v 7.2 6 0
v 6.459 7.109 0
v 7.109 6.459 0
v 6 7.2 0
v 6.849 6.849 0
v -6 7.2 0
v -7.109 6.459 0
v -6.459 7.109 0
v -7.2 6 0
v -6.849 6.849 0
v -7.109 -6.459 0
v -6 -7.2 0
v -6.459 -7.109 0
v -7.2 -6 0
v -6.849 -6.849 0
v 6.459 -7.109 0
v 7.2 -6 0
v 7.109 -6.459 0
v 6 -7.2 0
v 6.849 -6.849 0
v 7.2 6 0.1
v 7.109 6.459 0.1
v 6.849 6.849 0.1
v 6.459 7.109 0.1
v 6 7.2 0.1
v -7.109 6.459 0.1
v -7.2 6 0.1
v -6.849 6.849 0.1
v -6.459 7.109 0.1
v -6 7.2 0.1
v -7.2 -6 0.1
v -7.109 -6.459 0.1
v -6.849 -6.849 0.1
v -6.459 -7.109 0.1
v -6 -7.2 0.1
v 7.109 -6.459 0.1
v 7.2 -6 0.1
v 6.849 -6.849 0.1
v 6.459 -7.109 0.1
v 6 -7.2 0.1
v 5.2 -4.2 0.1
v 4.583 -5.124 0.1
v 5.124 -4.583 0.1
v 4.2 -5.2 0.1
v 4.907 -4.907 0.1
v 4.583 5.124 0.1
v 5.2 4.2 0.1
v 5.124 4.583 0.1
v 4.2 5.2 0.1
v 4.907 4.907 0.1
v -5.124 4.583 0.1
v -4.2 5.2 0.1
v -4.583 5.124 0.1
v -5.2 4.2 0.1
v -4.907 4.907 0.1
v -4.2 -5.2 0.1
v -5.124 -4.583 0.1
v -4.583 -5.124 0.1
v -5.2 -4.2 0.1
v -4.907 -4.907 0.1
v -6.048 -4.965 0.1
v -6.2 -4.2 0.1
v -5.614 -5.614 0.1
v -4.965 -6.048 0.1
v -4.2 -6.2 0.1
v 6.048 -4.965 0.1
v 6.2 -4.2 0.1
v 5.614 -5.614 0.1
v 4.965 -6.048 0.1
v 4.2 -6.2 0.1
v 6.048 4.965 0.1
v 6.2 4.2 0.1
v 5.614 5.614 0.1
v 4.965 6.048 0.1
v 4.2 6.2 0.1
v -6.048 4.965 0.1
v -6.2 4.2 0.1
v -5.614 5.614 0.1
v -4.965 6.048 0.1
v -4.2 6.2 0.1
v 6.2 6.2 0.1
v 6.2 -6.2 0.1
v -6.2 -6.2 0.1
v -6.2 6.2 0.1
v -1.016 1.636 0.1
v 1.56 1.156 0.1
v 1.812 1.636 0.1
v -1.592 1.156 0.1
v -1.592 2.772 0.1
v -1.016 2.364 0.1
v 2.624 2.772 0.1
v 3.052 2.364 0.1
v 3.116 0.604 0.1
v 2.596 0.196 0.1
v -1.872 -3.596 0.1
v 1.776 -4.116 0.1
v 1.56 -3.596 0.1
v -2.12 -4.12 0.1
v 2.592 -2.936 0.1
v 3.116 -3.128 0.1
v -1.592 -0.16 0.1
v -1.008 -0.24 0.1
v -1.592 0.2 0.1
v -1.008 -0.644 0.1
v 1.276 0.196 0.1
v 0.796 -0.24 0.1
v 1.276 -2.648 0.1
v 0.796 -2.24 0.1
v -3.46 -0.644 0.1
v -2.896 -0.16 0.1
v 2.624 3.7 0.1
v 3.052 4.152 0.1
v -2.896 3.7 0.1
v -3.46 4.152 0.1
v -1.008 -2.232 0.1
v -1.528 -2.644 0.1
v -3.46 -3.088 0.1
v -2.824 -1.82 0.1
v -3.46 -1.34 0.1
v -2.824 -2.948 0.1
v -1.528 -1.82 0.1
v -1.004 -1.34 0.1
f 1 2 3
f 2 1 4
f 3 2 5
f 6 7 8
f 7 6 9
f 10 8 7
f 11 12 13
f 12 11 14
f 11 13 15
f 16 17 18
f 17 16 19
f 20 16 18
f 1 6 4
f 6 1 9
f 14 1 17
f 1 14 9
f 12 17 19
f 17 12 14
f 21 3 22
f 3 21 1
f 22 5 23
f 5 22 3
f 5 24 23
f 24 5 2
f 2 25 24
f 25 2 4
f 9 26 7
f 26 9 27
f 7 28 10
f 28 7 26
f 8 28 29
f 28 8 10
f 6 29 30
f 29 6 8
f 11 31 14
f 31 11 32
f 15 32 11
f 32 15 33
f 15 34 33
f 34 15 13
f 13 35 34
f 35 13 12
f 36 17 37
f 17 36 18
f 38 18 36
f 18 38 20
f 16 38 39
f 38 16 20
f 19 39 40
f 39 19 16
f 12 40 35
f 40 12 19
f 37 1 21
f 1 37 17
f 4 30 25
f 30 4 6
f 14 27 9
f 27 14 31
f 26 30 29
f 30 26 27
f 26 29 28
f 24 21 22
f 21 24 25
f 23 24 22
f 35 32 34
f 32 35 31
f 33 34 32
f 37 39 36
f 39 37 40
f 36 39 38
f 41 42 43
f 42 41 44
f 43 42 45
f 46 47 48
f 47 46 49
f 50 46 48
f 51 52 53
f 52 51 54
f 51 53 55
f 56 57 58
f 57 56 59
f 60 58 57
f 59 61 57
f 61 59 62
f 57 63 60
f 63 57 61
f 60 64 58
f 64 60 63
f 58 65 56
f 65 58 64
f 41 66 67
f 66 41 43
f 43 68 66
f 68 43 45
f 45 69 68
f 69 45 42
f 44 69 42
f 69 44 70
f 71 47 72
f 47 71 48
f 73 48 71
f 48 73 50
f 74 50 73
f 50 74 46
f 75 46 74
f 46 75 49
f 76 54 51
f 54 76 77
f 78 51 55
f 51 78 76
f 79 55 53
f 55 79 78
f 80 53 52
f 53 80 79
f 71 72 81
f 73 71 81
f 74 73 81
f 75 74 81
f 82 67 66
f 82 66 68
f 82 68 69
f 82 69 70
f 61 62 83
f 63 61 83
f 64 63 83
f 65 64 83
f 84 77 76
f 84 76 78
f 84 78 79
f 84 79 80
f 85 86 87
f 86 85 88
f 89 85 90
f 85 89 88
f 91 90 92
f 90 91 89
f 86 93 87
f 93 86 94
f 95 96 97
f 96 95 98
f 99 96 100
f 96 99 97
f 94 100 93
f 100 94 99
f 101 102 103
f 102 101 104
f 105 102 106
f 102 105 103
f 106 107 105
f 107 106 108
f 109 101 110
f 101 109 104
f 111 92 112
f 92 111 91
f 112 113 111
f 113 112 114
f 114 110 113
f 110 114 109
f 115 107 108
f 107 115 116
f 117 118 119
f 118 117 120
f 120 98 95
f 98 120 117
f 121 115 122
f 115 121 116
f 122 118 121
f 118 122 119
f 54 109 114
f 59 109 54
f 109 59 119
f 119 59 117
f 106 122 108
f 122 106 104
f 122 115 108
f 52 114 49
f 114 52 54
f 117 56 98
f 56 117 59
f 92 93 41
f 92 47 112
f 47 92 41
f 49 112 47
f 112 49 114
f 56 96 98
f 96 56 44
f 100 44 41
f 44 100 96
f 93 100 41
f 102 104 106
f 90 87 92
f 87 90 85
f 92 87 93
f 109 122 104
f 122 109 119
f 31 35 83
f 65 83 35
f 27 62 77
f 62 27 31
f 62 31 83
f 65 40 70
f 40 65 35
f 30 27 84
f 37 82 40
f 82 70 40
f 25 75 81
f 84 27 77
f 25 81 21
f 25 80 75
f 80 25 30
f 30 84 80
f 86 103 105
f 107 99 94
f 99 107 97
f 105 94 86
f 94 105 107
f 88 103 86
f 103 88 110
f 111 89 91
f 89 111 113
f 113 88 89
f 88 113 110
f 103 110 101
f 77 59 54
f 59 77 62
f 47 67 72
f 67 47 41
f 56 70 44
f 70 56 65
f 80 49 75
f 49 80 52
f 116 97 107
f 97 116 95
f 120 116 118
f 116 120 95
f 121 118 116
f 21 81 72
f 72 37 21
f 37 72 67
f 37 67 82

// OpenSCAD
// file: ../p/1-4cyli.scad
use <../lib.scad>
function ldraw_lib__1_4cyli() = [
// 0 Cylinder 0.25
// 0 Name: 1-4cyli.dat
// 0 Author: James Jessiman
// 0 !LDRAW_ORG Primitive UPDATE 2012-01
// 0 !LICENSE Licensed under CC BY 4.0 : see CAreadme.txt
// 
// 0 BFC CERTIFY CCW
  [0,"BFC","CERTIFY"],
  [0,"BFC","CCW"],
// 
// 0 !HISTORY 2002-03-23 [sbliss] Added BFC statement.
// 0 !HISTORY 2002-04-25 [PTadmin] Official Update 2002-02
// 0 !HISTORY 2007-06-22 [PTadmin] Header formatted for Contributor Agreement
// 0 !HISTORY 2008-07-01 [PTadmin] Official Update 2008-01
// 0 !HISTORY 2012-02-16 [Philo] Changed to CCW
// 0 !HISTORY 2012-03-30 [PTadmin] Official Update 2012-01
// 
// 
// 4 16 1 1 0 0.9239 1 0.3827 0.9239 0 0.3827 1 0 0
  [4,16,1,1,0,0.9239,1,0.3827,0.9239,0,0.3827,1,0,0],
// 5 24 1 0 0 1 1 0 0.9239 0 0.3827 1 0 -1
  [5,24,1,0,0,1,1,0,0.9239,0,0.3827,1,0,-1],
// 4 16 0.9239 1 0.3827 0.7071 1 0.7071 0.7071 0 0.7071 0.9239 0 0.3827
  [4,16,0.9239,1,0.3827,0.7071,1,0.7071,0.7071,0,0.7071,0.9239,0,0.3827],
// 5 24 0.9239 0 0.3827 0.9239 1 0.3827 0.7071 0 0.7071 1 0 0
  [5,24,0.9239,0,0.3827,0.9239,1,0.3827,0.7071,0,0.7071,1,0,0],
// 4 16 0.7071 1 0.7071 0.3827 1 0.9239 0.3827 0 0.9239 0.7071 0 0.7071
  [4,16,0.7071,1,0.7071,0.3827,1,0.9239,0.3827,0,0.9239,0.7071,0,0.7071],
// 5 24 0.7071 0 0.7071 0.7071 1 0.7071 0.3827 0 0.9239 0.9239 0 0.3827
  [5,24,0.7071,0,0.7071,0.7071,1,0.7071,0.3827,0,0.9239,0.9239,0,0.3827],
// 4 16 0.3827 1 0.9239 0 1 1 0 0 1 0.3827 0 0.9239
  [4,16,0.3827,1,0.9239,0,1,1,0,0,1,0.3827,0,0.9239],
// 5 24 0.3827 0 0.9239 0.3827 1 0.9239 0 0 1 0.7071 0 0.7071
  [5,24,0.3827,0,0.9239,0.3827,1,0.9239,0,0,1,0.7071,0,0.7071],
// 5 24 0 0 1 0 1 1 0.3827 0 0.9239 -1 0 1
  [5,24,0,0,1,0,1,1,0.3827,0,0.9239,-1,0,1],
];
module ldraw_lib__1_4cyli(step=0, col=false, unit=2/5, alt=false, line=0.2, solid=!$preview)
    makepoly(ldraw_lib__1_4cyli(), step=step, col=col, unit=unit, alt=alt, line=line, solid=solid);
ldraw_lib__1_4cyli(line=0.2);
// file: s/6237277as01.scad
use <../../lib.scad>
use <../../p/1-4chrd.scad>
use <../../p/1-4cyli.scad>
function ldraw_lib__s__6237277as01() = [
// 0 ~Sticker  1.8 x  1.8 without Top Surface
// 0 Name: s\6237277as01.dat
// 0 Author: Alex Herrera [alanbrito98]
// 0 !LDRAW_ORG Subpart UPDATE 2023-04
// 0 !LICENSE Licensed under CC BY 4.0 : see CAreadme.txt
// 
// 0 BFC CERTIFY CCW
  [0,"BFC","CERTIFY"],
  [0,"BFC","CCW"],
// 
// 0 !HISTORY 2023-08-25 [OrionP] Official Update 2023-04
// 
// 
// 0 // Bottom
// 0 // Primitives
// 1 16 15 0 15 3 0 0 0 -1 0 0 0 3 1-4chrd.dat
  [1,16,15,0,15,3,0,0,0,-1,0,0,0,3, ldraw_lib__1_4chrd()],
// 1 16 -15 0 15 -3 0 0 0 -1 0 0 0 3 1-4chrd.dat
  [1,16,-15,0,15,-3,0,0,0,-1,0,0,0,3, ldraw_lib__1_4chrd()],
// 1 16 -15 0 -15 -3 0 0 0 -1 0 0 0 -3 1-4chrd.dat
  [1,16,-15,0,-15,-3,0,0,0,-1,0,0,0,-3, ldraw_lib__1_4chrd()],
// 1 16 15 0 -15 3 0 0 0 -1 0 0 0 -3 1-4chrd.dat
  [1,16,15,0,-15,3,0,0,0,-1,0,0,0,-3, ldraw_lib__1_4chrd()],
// 0 // Bottom Faces
// 4 16 18 0 15 -18 0 15 -15 0 18 15 0 18
  [4,16,18,0,15,-18,0,15,-15,0,18,15,0,18],
// 4 16 -18 0 -15 -18 0 15 18 0 15 18 0 -15
  [4,16,-18,0,-15,-18,0,15,18,0,15,18,0,-15],
// 4 16 15 0 -18 -15 0 -18 -18 0 -15 18 0 -15
  [4,16,15,0,-18,-15,0,-18,-18,0,-15,18,0,-15],
// 0 // Sides
// 0 // Primitives
// 1 16 15 0 15 3 0 0 0 -0.25 0 0 0 3 1-4cyli.dat
  [1,16,15,0,15,3,0,0,0,-0.25,0,0,0,3, ldraw_lib__1_4cyli()],
// 1 16 -15 0 15 -3 0 0 0 -0.25 0 0 0 3 1-4cyli.dat
  [1,16,-15,0,15,-3,0,0,0,-0.25,0,0,0,3, ldraw_lib__1_4cyli()],
// 1 16 -15 0 -15 -3 0 0 0 -0.25 0 0 0 -3 1-4cyli.dat
  [1,16,-15,0,-15,-3,0,0,0,-0.25,0,0,0,-3, ldraw_lib__1_4cyli()],
// 1 16 15 0 -15 3 0 0 0 -0.25 0 0 0 -3 1-4cyli.dat
  [1,16,15,0,-15,3,0,0,0,-0.25,0,0,0,-3, ldraw_lib__1_4cyli()],
// 0 // Side Faces
// 4 16 -15 0 -18 15 0 -18 15 -0.25 -18 -15 -0.25 -18
  [4,16,-15,0,-18,15,0,-18,15,-0.25,-18,-15,-0.25,-18],
// 4 16 18 0 -15 18 0 15 18 -0.25 15 18 -0.25 -15
  [4,16,18,0,-15,18,0,15,18,-0.25,15,18,-0.25,-15],
// 4 16 15 0 18 -15 0 18 -15 -0.25 18 15 -0.25 18
  [4,16,15,0,18,-15,0,18,-15,-0.25,18,15,-0.25,18],
// 4 16 -18 0 15 -18 0 -15 -18 -0.25 -15 -18 -0.25 15
  [4,16,-18,0,15,-18,0,-15,-18,-0.25,-15,-18,-0.25,15],
// 
];
module ldraw_lib__s__6237277as01(step=0, col=false, unit=2/5, alt=false, line=0.2, solid=!$preview)
    makepoly(ldraw_lib__s__6237277as01(), step=step, col=col, unit=unit, alt=alt, line=line, solid=solid);
ldraw_lib__s__6237277as01(line=0.2);
// file: ../p/1-4ring1.scad
use <../lib.scad>
function ldraw_lib__1_4ring1() = [
// 0 Ring  1 x 0.25
// 0 Name: 1-4ring1.dat
// 0 Author: Chris Dee [cwdee]
// 0 !LDRAW_ORG Primitive UPDATE 2012-01
// 0 !LICENSE Licensed under CC BY 4.0 : see CAreadme.txt
// 
// 0 BFC CERTIFY CCW
  [0,"BFC","CERTIFY"],
  [0,"BFC","CCW"],
// 
// 0 !HISTORY 2000-05-07 [PTadmin] Official Update 2000-01
// 0 !HISTORY 2002-11-22 [hafhead] Added BFC statement
// 0 !HISTORY 2002-11-30 [PTadmin] Official Update 2002-05
// 0 !HISTORY 2007-06-22 [PTadmin] Header formatted for Contributor Agreement
// 0 !HISTORY 2008-07-01 [PTadmin] Official Update 2008-01
// 0 !HISTORY 2012-02-16 [Philo] Changed to CCW
// 0 !HISTORY 2012-03-30 [PTadmin] Official Update 2012-01
// 
// 
// 4 16 2 0 0 1.8478 0 0.7654 0.9239 0 0.3827 1 0 0
  [4,16,2,0,0,1.8478,0,0.7654,0.9239,0,0.3827,1,0,0],
// 4 16 1.8478 0 0.7654 1.4142 0 1.4142 0.7071 0 0.7071 0.9239 0 0.3827
  [4,16,1.8478,0,0.7654,1.4142,0,1.4142,0.7071,0,0.7071,0.9239,0,0.3827],
// 4 16 1.4142 0 1.4142 0.7654 0 1.8478 0.3827 0 0.9239 0.7071 0 0.7071
  [4,16,1.4142,0,1.4142,0.7654,0,1.8478,0.3827,0,0.9239,0.7071,0,0.7071],
// 4 16 0.7654 0 1.8478 0 0 2 0 0 1 0.3827 0 0.9239
  [4,16,0.7654,0,1.8478,0,0,2,0,0,1,0.3827,0,0.9239],
];
module ldraw_lib__1_4ring1(step=0, col=false, unit=2/5, alt=false, line=0.2, solid=!$preview)
    makepoly(ldraw_lib__1_4ring1(), step=step, col=col, unit=unit, alt=alt, line=line, solid=solid);
ldraw_lib__1_4ring1(line=0.2);
// file: ../p/1-4ndis.scad
use <../lib.scad>
function ldraw_lib__1_4ndis() = [
// 0 Disc Negative 0.25
// 0 Name: 1-4ndis.dat
// 0 Author: James Jessiman
// 0 !LDRAW_ORG Primitive UPDATE 2012-01
// 0 !LICENSE Licensed under CC BY 4.0 : see CAreadme.txt
// 
// 0 BFC CERTIFY CCW
  [0,"BFC","CERTIFY"],
  [0,"BFC","CCW"],
// 
// 0 !HISTORY 2002-03-23 [sbliss] Added BFC Statement
// 0 !HISTORY 2002-04-25 [PTadmin] Official Update 2002-02
// 0 !HISTORY 2007-06-22 [PTadmin] Header formatted for Contributor Agreement
// 0 !HISTORY 2008-07-01 [PTadmin] Official Update 2008-01
// 0 !HISTORY 2012-02-16 [Philo] Changed to CCW
// 0 !HISTORY 2012-03-30 [PTadmin] Official Update 2012-01
// 
// 
// 3 16 0.9239 0 0.3827 1 0 0 1 0 1
  [3,16,0.9239,0,0.3827,1,0,0,1,0,1],
// 3 16 0.7071 0 0.7071 0.9239 0 0.3827 1 0 1
  [3,16,0.7071,0,0.7071,0.9239,0,0.3827,1,0,1],
// 3 16 0.3827 0 0.9239 0.7071 0 0.7071 1 0 1
  [3,16,0.3827,0,0.9239,0.7071,0,0.7071,1,0,1],
// 3 16 0 0 1 0.3827 0 0.9239 1 0 1
  [3,16,0,0,1,0.3827,0,0.9239,1,0,1],
];
module ldraw_lib__1_4ndis(step=0, col=false, unit=2/5, alt=false, line=0.2, solid=!$preview)
    makepoly(ldraw_lib__1_4ndis(), step=step, col=col, unit=unit, alt=alt, line=line, solid=solid);
ldraw_lib__1_4ndis(line=0.2);
// file: ../p/1-4chrd.scad
use <../lib.scad>
function ldraw_lib__1_4chrd() = [
// 0 Chord 0.25
// 0 Name: 1-4chrd.dat
// 0 Author: Tony Hafner [hafhead]
// 0 !LDRAW_ORG Primitive UPDATE 2012-02
// 0 !LICENSE Licensed under CC BY 2.0 and CC BY 4.0 : see CAreadme.txt
// 
// 0 BFC CERTIFY CCW
  [0,"BFC","CERTIFY"],
  [0,"BFC","CCW"],
// 
// 0 !HISTORY 2004-04-22 [PTadmin] Official Update 2004-02
// 0 !HISTORY 2007-10-09 [PTadmin] Header formatted for Contributor Agreement
// 0 !HISTORY 2008-07-01 [PTadmin] Official Update 2008-01
// 0 !HISTORY 2012-08-02 [MMR1988] Re-creation with PrimGen2 and Rectifier
// 0 !HISTORY 2012-08-09 [PTadmin] Official Update 2012-02
// 
// 
// 4 16 0.9239 0 0.3827 0.3827 0 0.9239 0 0 1 1 0 0
  [4,16,0.9239,0,0.3827,0.3827,0,0.9239,0,0,1,1,0,0],
// 3 16 0.7071 0 0.7071 0.3827 0 0.9239 0.9239 0 0.3827
  [3,16,0.7071,0,0.7071,0.3827,0,0.9239,0.9239,0,0.3827],
];
module ldraw_lib__1_4chrd(step=0, col=false, unit=2/5, alt=false, line=0.2, solid=!$preview)
    makepoly(ldraw_lib__1_4chrd(), step=step, col=col, unit=unit, alt=alt, line=line, solid=solid);
ldraw_lib__1_4chrd(line=0.2);
// main file
use <../lib.scad>
use <../p/1-4chrd.scad>
use <../p/1-4ndis.scad>
use <../p/1-4ring1.scad>
use <s/6237277as01.scad>
function ldraw_lib__6237277e() = [
// 0 Sticker  1.8 x  1.8 with Yellow "5" on Red Panel on Yellow Background
// 0 Name: 6237277e.dat
// 0 Author: Alex Herrera [alanbrito98]
// 0 !LDRAW_ORG Part UPDATE 2023-04
// 0 !LICENSE Licensed under CC BY 4.0 : see CAreadme.txt
// 
// 0 BFC CERTIFY CCW
  [0,"BFC","CERTIFY"],
  [0,"BFC","CCW"],
// 
// 0 !KEYWORDS set 21311, Voltron
// 
// 0 !HISTORY 2021-11-02 [Holly-Wood] Fixed comment and vertex
// 0 !HISTORY 2023-08-25 [OrionP] Official Update 2023-04
// 
// 
// 0 // Box
// 
// 1 16 0 0 0 1 0 0 0 1 0 0 0 1 s\6237277as01.dat
  [1,16,0,0,0,1,0,0,0,1,0,0,0,1, ldraw_lib__s__6237277as01()],
// 0 // Primitives
// 1 7 -15 -0.25 15 -3 0 0 0 1 0 0 0 3 1-4chrd.dat
  [1,7,-15,-0.25,15,-3,0,0,0,1,0,0,0,3, ldraw_lib__1_4chrd()],
// 1 7 15 -0.25 15 3 0 0 0 1 0 0 0 3 1-4chrd.dat
  [1,7,15,-0.25,15,3,0,0,0,1,0,0,0,3, ldraw_lib__1_4chrd()],
// 1 7 -15 -0.25 -15 -3 0 0 0 1 0 0 0 -3 1-4chrd.dat
  [1,7,-15,-0.25,-15,-3,0,0,0,1,0,0,0,-3, ldraw_lib__1_4chrd()],
// 1 7 15 -0.25 -15 3 0 0 0 1 0 0 0 -3 1-4chrd.dat
  [1,7,15,-0.25,-15,3,0,0,0,1,0,0,0,-3, ldraw_lib__1_4chrd()],
// 0 // Pattern
// 0 // Primitives
// 1 4 10.5 -0.25 -10.5 2.5 0 0 0 1 0 0 0 -2.5 1-4chrd.dat
  [1,4,10.5,-0.25,-10.5,2.5,0,0,0,1,0,0,0,-2.5, ldraw_lib__1_4chrd()],
// 1 4 10.5 -0.25 10.5 2.5 0 0 0 1 0 0 0 2.5 1-4chrd.dat
  [1,4,10.5,-0.25,10.5,2.5,0,0,0,1,0,0,0,2.5, ldraw_lib__1_4chrd()],
// 1 4 -10.5 -0.25 10.5 -2.5 0 0 0 1 0 0 0 2.5 1-4chrd.dat
  [1,4,-10.5,-0.25,10.5,-2.5,0,0,0,1,0,0,0,2.5, ldraw_lib__1_4chrd()],
// 1 4 -10.5 -0.25 -10.5 -2.5 0 0 0 1 0 0 0 -2.5 1-4chrd.dat
  [1,4,-10.5,-0.25,-10.5,-2.5,0,0,0,1,0,0,0,-2.5, ldraw_lib__1_4chrd()],
// 1 14 -10.5 -0.25 -10.5 -2.5 0 0 0 1 0 0 0 -2.5 1-4ring1.dat
  [1,14,-10.5,-0.25,-10.5,-2.5,0,0,0,1,0,0,0,-2.5, ldraw_lib__1_4ring1()],
// 1 14 10.5 -0.25 -10.5 2.5 0 0 0 1 0 0 0 -2.5 1-4ring1.dat
  [1,14,10.5,-0.25,-10.5,2.5,0,0,0,1,0,0,0,-2.5, ldraw_lib__1_4ring1()],
// 1 14 10.5 -0.25 10.5 2.5 0 0 0 1 0 0 0 2.5 1-4ring1.dat
  [1,14,10.5,-0.25,10.5,2.5,0,0,0,1,0,0,0,2.5, ldraw_lib__1_4ring1()],
// 1 14 -10.5 -0.25 10.5 -2.5 0 0 0 1 0 0 0 2.5 1-4ring1.dat
  [1,14,-10.5,-0.25,10.5,-2.5,0,0,0,1,0,0,0,2.5, ldraw_lib__1_4ring1()],
// 1 7 10.5 -0.25 10.5 5 0 0 0 1 0 0 0 5 1-4ndis.dat
  [1,7,10.5,-0.25,10.5,5,0,0,0,1,0,0,0,5, ldraw_lib__1_4ndis()],
// 1 7 10.5 -0.25 -10.5 5 0 0 0 1 0 0 0 -5 1-4ndis.dat
  [1,7,10.5,-0.25,-10.5,5,0,0,0,1,0,0,0,-5, ldraw_lib__1_4ndis()],
// 1 7 -10.5 -0.25 -10.5 -5 0 0 0 1 0 0 0 -5 1-4ndis.dat
  [1,7,-10.5,-0.25,-10.5,-5,0,0,0,1,0,0,0,-5, ldraw_lib__1_4ndis()],
// 1 7 -10.5 -0.25 10.5 -5 0 0 0 1 0 0 0 5 1-4ndis.dat
  [1,7,-10.5,-0.25,10.5,-5,0,0,0,1,0,0,0,5, ldraw_lib__1_4ndis()],
// 0 // Pattern
// 0 // Black
// 4 0 -3.98 -0.25 2.89 3.9 -0.25 2.89 4.53 -0.25 4.09 -2.54 -0.25 4.09
  [4,0,-3.98,-0.25,2.89,3.9,-0.25,2.89,4.53,-0.25,4.09,-2.54,-0.25,4.09],
// 4 0 -3.98 -0.25 6.93 -3.98 -0.25 2.89 -2.54 -0.25 4.09 -2.54 -0.25 5.91
  [4,0,-3.98,-0.25,6.93,-3.98,-0.25,2.89,-2.54,-0.25,4.09,-2.54,-0.25,5.91],
// 4 0 6.56 -0.25 6.93 -3.98 -0.25 6.93 -2.54 -0.25 5.91 7.63 -0.25 5.91
  [4,0,6.56,-0.25,6.93,-3.98,-0.25,6.93,-2.54,-0.25,5.91,7.63,-0.25,5.91],
// 4 0 3.9 -0.25 2.89 6.49 -0.25 0.49 7.79 -0.25 1.51 4.53 -0.25 4.09
  [4,0,3.9,-0.25,2.89,6.49,-0.25,0.49,7.79,-0.25,1.51,4.53,-0.25,4.09],
// 4 0 3.9 -0.25 -8.99 -4.68 -0.25 -8.99 -5.3 -0.25 -10.3 4.44 -0.25 -10.29
  [4,0,3.9,-0.25,-8.99,-4.68,-0.25,-8.99,-5.3,-0.25,-10.3,4.44,-0.25,-10.29],
// 4 0 6.48 -0.25 -7.34 3.9 -0.25 -8.99 4.44 -0.25 -10.29 7.79 -0.25 -7.82
  [4,0,6.48,-0.25,-7.34,3.9,-0.25,-8.99,4.44,-0.25,-10.29,7.79,-0.25,-7.82],
// 4 0 6.49 -0.25 0.49 6.48 -0.25 -7.34 7.79 -0.25 -7.82 7.79 -0.25 1.51
  [4,0,6.49,-0.25,0.49,6.48,-0.25,-7.34,7.79,-0.25,-7.82,7.79,-0.25,1.51],
// 4 0 -3.98 -0.25 0.5 -3.98 -0.25 -0.4 -2.52 -0.25 -1.61 -2.52 -0.25 -0.6
  [4,0,-3.98,-0.25,0.5,-3.98,-0.25,-0.4,-2.52,-0.25,-1.61,-2.52,-0.25,-0.6],
// 4 0 3.19 -0.25 0.49 -3.98 -0.25 0.5 -2.52 -0.25 -0.6 1.99 -0.25 -0.6
  [4,0,3.19,-0.25,0.49,-3.98,-0.25,0.5,-2.52,-0.25,-0.6,1.99,-0.25,-0.6],
// 4 0 3.19 -0.25 0.49 1.99 -0.25 -0.6 1.99 -0.25 -5.6 3.19 -0.25 -6.62
  [4,0,3.19,-0.25,0.49,1.99,-0.25,-0.6,1.99,-0.25,-5.6,3.19,-0.25,-6.62],
// 4 0 -7.24 -0.25 -0.4 -8.65 -0.25 -1.61 -2.52 -0.25 -1.61 -3.98 -0.25 -0.4
  [4,0,-7.24,-0.25,-0.4,-8.65,-0.25,-1.61,-2.52,-0.25,-1.61,-3.98,-0.25,-0.4],
// 4 0 6.56 -0.25 6.93 7.63 -0.25 5.91 7.63 -0.25 10.38 6.56 -0.25 9.25
  [4,0,6.56,-0.25,6.93,7.63,-0.25,5.91,7.63,-0.25,10.38,6.56,-0.25,9.25],
// 4 0 6.56 -0.25 9.25 7.63 -0.25 10.38 -8.65 -0.25 10.38 -7.24 -0.25 9.25
  [4,0,6.56,-0.25,9.25,7.63,-0.25,10.38,-8.65,-0.25,10.38,-7.24,-0.25,9.25],
// 4 0 -7.24 -0.25 9.25 -8.65 -0.25 10.38 -8.65 -0.25 -1.61 -7.24 -0.25 -0.4
  [4,0,-7.24,-0.25,9.25,-8.65,-0.25,10.38,-8.65,-0.25,-1.61,-7.24,-0.25,-0.4],
// 4 0 1.99 -0.25 -5.6 -2.52 -0.25 -5.58 -3.82 -0.25 -6.61 3.19 -0.25 -6.62
  [4,0,1.99,-0.25,-5.6,-2.52,-0.25,-5.58,-3.82,-0.25,-6.61,3.19,-0.25,-6.62],
// 4 0 -8.65 -0.25 -7.72 -7.06 -0.25 -7.37 -7.06 -0.25 -4.55 -8.65 -0.25 -3.35
  [4,0,-8.65,-0.25,-7.72,-7.06,-0.25,-7.37,-7.06,-0.25,-4.55,-8.65,-0.25,-3.35],
// 4 0 -7.06 -0.25 -7.37 -8.65 -0.25 -7.72 -5.3 -0.25 -10.3 -4.68 -0.25 -8.99
  [4,0,-7.06,-0.25,-7.37,-8.65,-0.25,-7.72,-5.3,-0.25,-10.3,-4.68,-0.25,-8.99],
// 4 0 -2.52 -0.25 -5.58 -2.51 -0.25 -3.35 -3.82 -0.25 -4.55 -3.82 -0.25 -6.61
  [4,0,-2.52,-0.25,-5.58,-2.51,-0.25,-3.35,-3.82,-0.25,-4.55,-3.82,-0.25,-6.61],
// 4 0 -2.51 -0.25 -3.35 -8.65 -0.25 -3.35 -7.06 -0.25 -4.55 -3.82 -0.25 -4.55
  [4,0,-2.51,-0.25,-3.35,-8.65,-0.25,-3.35,-7.06,-0.25,-4.55,-3.82,-0.25,-4.55],
// 0 // Red
// 3 4 -13 -0.25 10.5 -8.65 -0.25 -1.61 -8.65 -0.25 10.38
  [3,4,-13,-0.25,10.5,-8.65,-0.25,-1.61,-8.65,-0.25,10.38],
// 4 4 -13 -0.25 -10.5 -8.65 -0.25 -3.35 -8.65 -0.25 -1.61 -13 -0.25 10.5
  [4,4,-13,-0.25,-10.5,-8.65,-0.25,-3.35,-8.65,-0.25,-1.61,-13,-0.25,10.5],
// 3 4 -8.65 -0.25 -3.35 -13 -0.25 -10.5 -8.65 -0.25 -7.72
  [3,4,-8.65,-0.25,-3.35,-13,-0.25,-10.5,-8.65,-0.25,-7.72],
// 4 4 1.99 -0.25 -0.6 -2.52 -0.25 -1.61 -2.51 -0.25 -3.35 1.99 -0.25 -5.6
  [4,4,1.99,-0.25,-0.6,-2.52,-0.25,-1.61,-2.51,-0.25,-3.35,1.99,-0.25,-5.6],
// 3 4 -2.51 -0.25 -3.35 -2.52 -0.25 -5.58 1.99 -0.25 -5.6
  [3,4,-2.51,-0.25,-3.35,-2.52,-0.25,-5.58,1.99,-0.25,-5.6],
// 4 4 -10.5 -0.25 13 -13 -0.25 10.5 -8.65 -0.25 10.38 10.5 -0.25 13
  [4,4,-10.5,-0.25,13,-13,-0.25,10.5,-8.65,-0.25,10.38,10.5,-0.25,13],
// 4 4 -10.5 -0.25 -13 -5.3 -0.25 -10.3 -8.65 -0.25 -7.72 -13 -0.25 -10.5
  [4,4,-10.5,-0.25,-13,-5.3,-0.25,-10.3,-8.65,-0.25,-7.72,-13,-0.25,-10.5],
// 3 4 7.63 -0.25 5.91 7.79 -0.25 1.51 13 -0.25 -10.5
  [3,4,7.63,-0.25,5.91,7.79,-0.25,1.51,13,-0.25,-10.5],
// 4 4 13 -0.25 10.5 7.63 -0.25 10.38 7.63 -0.25 5.91 13 -0.25 -10.5
  [4,4,13,-0.25,10.5,7.63,-0.25,10.38,7.63,-0.25,5.91,13,-0.25,-10.5],
// 4 4 10.5 -0.25 13 -8.65 -0.25 10.38 7.63 -0.25 10.38 13 -0.25 10.5
  [4,4,10.5,-0.25,13,-8.65,-0.25,10.38,7.63,-0.25,10.38,13,-0.25,10.5],
// 4 4 10.5 -0.25 -13 4.44 -0.25 -10.29 -5.3 -0.25 -10.3 -10.5 -0.25 -13
  [4,4,10.5,-0.25,-13,4.44,-0.25,-10.29,-5.3,-0.25,-10.3,-10.5,-0.25,-13],
// 4 4 13 -0.25 -10.5 7.79 -0.25 -7.82 4.44 -0.25 -10.29 10.5 -0.25 -13
  [4,4,13,-0.25,-10.5,7.79,-0.25,-7.82,4.44,-0.25,-10.29,10.5,-0.25,-13],
// 3 4 7.79 -0.25 1.51 7.79 -0.25 -7.82 13 -0.25 -10.5
  [3,4,7.79,-0.25,1.51,7.79,-0.25,-7.82,13,-0.25,-10.5],
// 3 4 -2.52 -0.25 -0.6 -2.52 -0.25 -1.61 1.99 -0.25 -0.6
  [3,4,-2.52,-0.25,-0.6,-2.52,-0.25,-1.61,1.99,-0.25,-0.6],
// 4 4 -2.54 -0.25 5.91 -2.54 -0.25 4.09 4.53 -0.25 4.09 7.63 -0.25 5.91
  [4,4,-2.54,-0.25,5.91,-2.54,-0.25,4.09,4.53,-0.25,4.09,7.63,-0.25,5.91],
// 3 4 7.63 -0.25 5.91 4.53 -0.25 4.09 7.79 -0.25 1.51
  [3,4,7.63,-0.25,5.91,4.53,-0.25,4.09,7.79,-0.25,1.51],
// 4 4 -8.65 -0.25 -1.61 -8.65 -0.25 -3.35 -2.51 -0.25 -3.35 -2.52 -0.25 -1.61
  [4,4,-8.65,-0.25,-1.61,-8.65,-0.25,-3.35,-2.51,-0.25,-3.35,-2.52,-0.25,-1.61],
// 0 // Light grey
// 3 7 -18 -0.25 -15 -15 -0.25 -18 -15.5 -0.25 -15.5
  [3,7,-18,-0.25,-15,-15,-0.25,-18,-15.5,-0.25,-15.5],
// 3 7 -10.5 -0.25 -15.5 -15.5 -0.25 -15.5 -15 -0.25 -18
  [3,7,-10.5,-0.25,-15.5,-15.5,-0.25,-15.5,-15,-0.25,-18],
// 4 7 -15.5 -0.25 -10.5 -15.5 -0.25 10.5 -18 -0.25 15 -18 -0.25 -15
  [4,7,-15.5,-0.25,-10.5,-15.5,-0.25,10.5,-18,-0.25,15,-18,-0.25,-15],
// 3 7 -15.5 -0.25 -10.5 -18 -0.25 -15 -15.5 -0.25 -15.5
  [3,7,-15.5,-0.25,-10.5,-18,-0.25,-15,-15.5,-0.25,-15.5],
// 4 7 10.5 -0.25 -15.5 -10.5 -0.25 -15.5 -15 -0.25 -18 15 -0.25 -18
  [4,7,10.5,-0.25,-15.5,-10.5,-0.25,-15.5,-15,-0.25,-18,15,-0.25,-18],
// 3 7 -15 -0.25 18 -18 -0.25 15 -15.5 -0.25 15.5
  [3,7,-15,-0.25,18,-18,-0.25,15,-15.5,-0.25,15.5],
// 3 7 18 -0.25 -15 15.5 -0.25 -15.5 15 -0.25 -18
  [3,7,18,-0.25,-15,15.5,-0.25,-15.5,15,-0.25,-18],
// 3 7 15.5 -0.25 -15.5 10.5 -0.25 -15.5 15 -0.25 -18
  [3,7,15.5,-0.25,-15.5,10.5,-0.25,-15.5,15,-0.25,-18],
// 3 7 15 -0.25 18 10.5 -0.25 15.5 15.5 -0.25 15.5
  [3,7,15,-0.25,18,10.5,-0.25,15.5,15.5,-0.25,15.5],
// 3 7 -15.5 -0.25 15.5 -18 -0.25 15 -15.5 -0.25 10.5
  [3,7,-15.5,-0.25,15.5,-18,-0.25,15,-15.5,-0.25,10.5],
// 3 7 15 -0.25 18 15.5 -0.25 15.5 18 -0.25 15
  [3,7,15,-0.25,18,15.5,-0.25,15.5,18,-0.25,15],
// 
// 4 7 10.5 -0.25 15.5 15 -0.25 18 -15 -0.25 18 -10.5 -0.25 15.5
  [4,7,10.5,-0.25,15.5,15,-0.25,18,-15,-0.25,18,-10.5,-0.25,15.5],
// 3 7 -15 -0.25 18 -15.5 -0.25 15.5 -10.5 -0.25 15.5
  [3,7,-15,-0.25,18,-15.5,-0.25,15.5,-10.5,-0.25,15.5],
// 0 // Yellow
// 3 14 3.9 -0.25 2.89 -3.98 -0.25 0.5 3.19 -0.25 0.49
  [3,14,3.9,-0.25,2.89,-3.98,-0.25,0.5,3.19,-0.25,0.49],
// 4 14 6.48 -0.25 -7.34 6.49 -0.25 0.49 3.19 -0.25 -6.62 3.9 -0.25 -8.99
  [4,14,6.48,-0.25,-7.34,6.49,-0.25,0.49,3.19,-0.25,-6.62,3.9,-0.25,-8.99],
// 4 14 6.49 -0.25 0.49 3.9 -0.25 2.89 3.19 -0.25 0.49 3.19 -0.25 -6.62
  [4,14,6.49,-0.25,0.49,3.9,-0.25,2.89,3.19,-0.25,0.49,3.19,-0.25,-6.62],
// 4 14 -3.98 -0.25 2.89 -7.24 -0.25 -0.4 -3.98 -0.25 0.5 3.9 -0.25 2.89
  [4,14,-3.98,-0.25,2.89,-7.24,-0.25,-0.4,-3.98,-0.25,0.5,3.9,-0.25,2.89],
// 4 14 6.56 -0.25 6.93 6.56 -0.25 9.25 -7.24 -0.25 9.25 -3.98 -0.25 6.93
  [4,14,6.56,-0.25,6.93,6.56,-0.25,9.25,-7.24,-0.25,9.25,-3.98,-0.25,6.93],
// 4 14 -3.98 -0.25 6.93 -7.24 -0.25 9.25 -7.24 -0.25 -0.4 -3.98 -0.25 2.89
  [4,14,-3.98,-0.25,6.93,-7.24,-0.25,9.25,-7.24,-0.25,-0.4,-3.98,-0.25,2.89],
// 3 14 -3.98 -0.25 0.5 -7.24 -0.25 -0.4 -3.98 -0.25 -0.4
  [3,14,-3.98,-0.25,0.5,-7.24,-0.25,-0.4,-3.98,-0.25,-0.4],
// 4 14 -13 -0.25 10.5 -15.5 -0.25 10.5 -15.5 -0.25 -10.5 -13 -0.25 -10.5
  [4,14,-13,-0.25,10.5,-15.5,-0.25,10.5,-15.5,-0.25,-10.5,-13,-0.25,-10.5],
// 4 14 13 -0.25 -10.5 15.5 -0.25 -10.5 15.5 -0.25 10.5 13 -0.25 10.5
  [4,14,13,-0.25,-10.5,15.5,-0.25,-10.5,15.5,-0.25,10.5,13,-0.25,10.5],
// 4 14 10.5 -0.25 -15.5 10.5 -0.25 -13 -10.5 -0.25 -13 -10.5 -0.25 -15.5
  [4,14,10.5,-0.25,-15.5,10.5,-0.25,-13,-10.5,-0.25,-13,-10.5,-0.25,-15.5],
// 4 14 10.5 -0.25 13 10.5 -0.25 15.5 -10.5 -0.25 15.5 -10.5 -0.25 13
  [4,14,10.5,-0.25,13,10.5,-0.25,15.5,-10.5,-0.25,15.5,-10.5,-0.25,13],
// 4 14 3.9 -0.25 -8.99 3.19 -0.25 -6.62 -3.82 -0.25 -6.61 -4.68 -0.25 -8.99
  [4,14,3.9,-0.25,-8.99,3.19,-0.25,-6.62,-3.82,-0.25,-6.61,-4.68,-0.25,-8.99],
// 4 14 -7.06 -0.25 -7.37 -4.68 -0.25 -8.99 -3.82 -0.25 -6.61 -7.06 -0.25 -4.55
  [4,14,-7.06,-0.25,-7.37,-4.68,-0.25,-8.99,-3.82,-0.25,-6.61,-7.06,-0.25,-4.55],
// 3 14 -3.82 -0.25 -4.55 -7.06 -0.25 -4.55 -3.82 -0.25 -6.61
  [3,14,-3.82,-0.25,-4.55,-7.06,-0.25,-4.55,-3.82,-0.25,-6.61],
// 3 7 18 -.25 15 15.5 -.25 15.5 15.5 -.25 10.5
  [3,7,18,-.25,15,15.5,-.25,15.5,15.5,-.25,10.5],
// 4 7 15.5 -.25 10.5 15.5 -.25 -10.5 18 -.25 -15 18 -.25 15
  [4,7,15.5,-.25,10.5,15.5,-.25,-10.5,18,-.25,-15,18,-.25,15],
// 3 7 18 -.25 -15 15.5 -.25 -10.5 15.5 -.25 -15.5
  [3,7,18,-.25,-15,15.5,-.25,-10.5,15.5,-.25,-15.5],
];
module ldraw_lib__6237277e(step=0, col=false, unit=2/5, alt=false, line=0.2, solid=!$preview)
    makepoly(ldraw_lib__6237277e(), step=step, col=col, unit=unit, alt=alt, line=line, solid=solid);
ldraw_lib__6237277e(line=0.2);
